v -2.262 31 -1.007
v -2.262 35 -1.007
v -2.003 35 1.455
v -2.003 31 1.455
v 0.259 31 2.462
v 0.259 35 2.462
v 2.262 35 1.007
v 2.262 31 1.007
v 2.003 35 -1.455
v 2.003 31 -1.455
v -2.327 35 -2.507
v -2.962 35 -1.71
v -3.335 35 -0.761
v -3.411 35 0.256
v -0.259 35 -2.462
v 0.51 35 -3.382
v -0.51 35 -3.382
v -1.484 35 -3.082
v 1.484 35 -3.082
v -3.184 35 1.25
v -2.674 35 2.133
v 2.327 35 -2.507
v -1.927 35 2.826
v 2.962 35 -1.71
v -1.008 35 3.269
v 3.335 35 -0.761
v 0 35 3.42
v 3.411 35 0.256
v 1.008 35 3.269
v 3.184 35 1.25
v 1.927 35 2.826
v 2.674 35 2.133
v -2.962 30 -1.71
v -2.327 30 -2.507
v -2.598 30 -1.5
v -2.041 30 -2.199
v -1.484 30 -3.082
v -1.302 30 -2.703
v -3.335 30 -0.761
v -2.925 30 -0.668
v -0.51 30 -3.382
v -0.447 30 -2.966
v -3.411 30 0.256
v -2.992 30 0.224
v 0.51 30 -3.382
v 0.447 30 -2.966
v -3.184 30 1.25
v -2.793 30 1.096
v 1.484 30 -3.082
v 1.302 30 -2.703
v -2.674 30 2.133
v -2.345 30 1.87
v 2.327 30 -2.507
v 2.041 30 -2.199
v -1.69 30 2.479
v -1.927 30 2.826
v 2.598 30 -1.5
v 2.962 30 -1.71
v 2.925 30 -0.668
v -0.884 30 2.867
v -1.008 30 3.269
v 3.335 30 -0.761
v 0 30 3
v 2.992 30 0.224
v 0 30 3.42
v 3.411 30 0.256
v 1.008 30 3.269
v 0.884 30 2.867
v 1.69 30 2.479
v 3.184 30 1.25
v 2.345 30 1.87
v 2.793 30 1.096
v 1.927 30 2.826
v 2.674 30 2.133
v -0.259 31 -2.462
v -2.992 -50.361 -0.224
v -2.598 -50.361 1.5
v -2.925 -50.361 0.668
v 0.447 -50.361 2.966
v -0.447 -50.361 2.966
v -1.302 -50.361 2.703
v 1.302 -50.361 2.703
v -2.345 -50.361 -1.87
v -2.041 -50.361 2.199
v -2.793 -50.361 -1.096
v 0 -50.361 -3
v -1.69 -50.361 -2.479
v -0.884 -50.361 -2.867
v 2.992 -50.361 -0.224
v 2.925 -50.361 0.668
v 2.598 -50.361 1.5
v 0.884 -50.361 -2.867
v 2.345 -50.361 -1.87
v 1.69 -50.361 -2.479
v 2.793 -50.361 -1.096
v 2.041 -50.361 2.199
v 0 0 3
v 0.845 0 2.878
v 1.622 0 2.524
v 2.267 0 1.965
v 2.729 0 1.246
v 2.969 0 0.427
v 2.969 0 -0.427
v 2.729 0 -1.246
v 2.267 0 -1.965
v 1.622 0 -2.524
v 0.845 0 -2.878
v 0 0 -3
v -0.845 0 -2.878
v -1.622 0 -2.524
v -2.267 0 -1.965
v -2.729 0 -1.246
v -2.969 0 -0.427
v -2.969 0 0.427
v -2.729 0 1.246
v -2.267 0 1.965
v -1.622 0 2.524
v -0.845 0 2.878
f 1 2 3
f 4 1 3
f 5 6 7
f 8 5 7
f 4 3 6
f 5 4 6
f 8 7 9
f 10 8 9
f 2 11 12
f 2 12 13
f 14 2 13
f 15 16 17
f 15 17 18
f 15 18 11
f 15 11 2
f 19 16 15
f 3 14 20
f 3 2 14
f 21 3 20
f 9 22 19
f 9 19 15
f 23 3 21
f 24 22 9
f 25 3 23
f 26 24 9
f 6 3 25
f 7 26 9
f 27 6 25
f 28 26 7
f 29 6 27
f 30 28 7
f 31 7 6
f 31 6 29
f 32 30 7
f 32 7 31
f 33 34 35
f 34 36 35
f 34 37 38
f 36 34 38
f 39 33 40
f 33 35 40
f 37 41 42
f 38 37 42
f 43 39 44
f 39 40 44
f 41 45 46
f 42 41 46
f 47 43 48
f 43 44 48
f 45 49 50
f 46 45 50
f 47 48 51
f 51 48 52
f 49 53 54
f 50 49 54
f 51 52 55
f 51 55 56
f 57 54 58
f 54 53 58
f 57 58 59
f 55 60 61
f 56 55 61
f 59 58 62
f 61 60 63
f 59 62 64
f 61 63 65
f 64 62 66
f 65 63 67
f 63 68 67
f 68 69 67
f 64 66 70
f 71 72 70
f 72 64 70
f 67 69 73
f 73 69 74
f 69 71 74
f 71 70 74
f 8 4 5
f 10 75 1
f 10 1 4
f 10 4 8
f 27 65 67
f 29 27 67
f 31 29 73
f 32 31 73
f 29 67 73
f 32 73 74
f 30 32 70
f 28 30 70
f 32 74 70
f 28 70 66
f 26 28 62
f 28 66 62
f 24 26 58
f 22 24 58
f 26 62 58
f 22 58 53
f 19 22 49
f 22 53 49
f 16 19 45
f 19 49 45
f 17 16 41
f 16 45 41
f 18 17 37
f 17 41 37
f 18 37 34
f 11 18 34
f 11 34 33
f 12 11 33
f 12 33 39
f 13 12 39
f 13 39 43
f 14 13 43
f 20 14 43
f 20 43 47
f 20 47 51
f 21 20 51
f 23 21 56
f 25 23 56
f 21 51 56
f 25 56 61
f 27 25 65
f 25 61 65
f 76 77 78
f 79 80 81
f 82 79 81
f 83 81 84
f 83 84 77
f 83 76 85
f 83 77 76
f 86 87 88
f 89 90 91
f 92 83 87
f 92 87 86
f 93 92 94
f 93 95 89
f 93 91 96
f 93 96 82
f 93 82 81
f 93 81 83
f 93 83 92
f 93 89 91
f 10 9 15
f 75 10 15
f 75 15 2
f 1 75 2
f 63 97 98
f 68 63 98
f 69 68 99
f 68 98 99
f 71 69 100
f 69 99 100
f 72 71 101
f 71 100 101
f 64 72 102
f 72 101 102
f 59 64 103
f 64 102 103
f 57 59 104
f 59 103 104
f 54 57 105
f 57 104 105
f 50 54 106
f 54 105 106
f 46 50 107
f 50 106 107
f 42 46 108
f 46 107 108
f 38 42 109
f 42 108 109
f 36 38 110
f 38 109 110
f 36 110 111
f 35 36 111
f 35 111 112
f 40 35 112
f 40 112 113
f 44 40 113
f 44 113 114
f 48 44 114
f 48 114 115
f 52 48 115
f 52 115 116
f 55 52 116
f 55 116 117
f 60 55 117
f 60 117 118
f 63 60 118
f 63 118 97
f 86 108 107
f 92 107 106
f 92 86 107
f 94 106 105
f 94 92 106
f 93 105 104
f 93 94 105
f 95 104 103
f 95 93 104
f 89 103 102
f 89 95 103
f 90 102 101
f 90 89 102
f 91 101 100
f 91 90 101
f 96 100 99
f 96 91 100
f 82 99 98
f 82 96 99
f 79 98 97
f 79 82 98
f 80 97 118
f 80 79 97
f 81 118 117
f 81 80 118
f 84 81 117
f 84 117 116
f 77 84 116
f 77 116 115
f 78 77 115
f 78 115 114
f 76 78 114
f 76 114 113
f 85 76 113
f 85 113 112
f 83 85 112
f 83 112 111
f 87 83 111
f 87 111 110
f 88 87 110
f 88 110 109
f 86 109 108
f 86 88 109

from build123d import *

# Parameters (mm, degrees)
SKETCH1_R           = 3
BOSS_EXTRUDE1_DEPTH = 30
SKETCH2_R           = 3.420462188
BOSS_EXTRUDE2_DEPTH = 5
CUT_EXTRUDE1_DEPTH  = 4
BOSS_EXTRUDE3_START = 50.360841313
SKETCH4_R           = 3
BOSS_EXTRUDE3_DEPTH = 50.360841313


with BuildPart() as part:
    # Sketch1 → Boss-Extrude1 (new body)
    with BuildSketch(Plane(origin=(0, 0, 0), x_dir=(1, 0, 0), z_dir=(0, 1, 0))):
        with Locations(Location((0, 0, 0), (0, 0, 270))):
            Circle(SKETCH1_R)
    extrude(amount=BOSS_EXTRUDE1_DEPTH)

    # Sketch2 → Boss-Extrude2 (add)
    with BuildSketch(Plane(origin=(0, 30, 0), x_dir=(1, 0, 0), z_dir=(0, 1, 0))):
        with Locations(Location((0, 0, 0), (0, 0, 270))):
            Circle(SKETCH2_R)
    extrude(amount=BOSS_EXTRUDE2_DEPTH)

    # Sketch3 → Cut-Extrude1 (cut)
    with BuildSketch(Plane(origin=(0, 35, 0), x_dir=(1, 0, 0), z_dir=(0, 1, 0))):
        Polygon((-0.25878856, 2.462260088), (-2.261774067, 1.007012576), (-2.002985506, -1.455247511), (0.25878856, -2.462260088), (2.261774067, -1.007012576), (2.002985506, 1.455247511), align=None)
    extrude(amount=-CUT_EXTRUDE1_DEPTH, mode=Mode.SUBTRACT)

    # Sketch4 → Boss-Extrude3 (add)
    with BuildSketch(Plane(origin=(0, 0, 0), x_dir=(-1, 0, 0), z_dir=(0, -1, 0)).offset(BOSS_EXTRUDE3_START)):
        with Locations(Location((0, 0, 0), (0, 0, 90))):
            Circle(SKETCH4_R)
    extrude(amount=-BOSS_EXTRUDE3_DEPTH)


solid = part.part
